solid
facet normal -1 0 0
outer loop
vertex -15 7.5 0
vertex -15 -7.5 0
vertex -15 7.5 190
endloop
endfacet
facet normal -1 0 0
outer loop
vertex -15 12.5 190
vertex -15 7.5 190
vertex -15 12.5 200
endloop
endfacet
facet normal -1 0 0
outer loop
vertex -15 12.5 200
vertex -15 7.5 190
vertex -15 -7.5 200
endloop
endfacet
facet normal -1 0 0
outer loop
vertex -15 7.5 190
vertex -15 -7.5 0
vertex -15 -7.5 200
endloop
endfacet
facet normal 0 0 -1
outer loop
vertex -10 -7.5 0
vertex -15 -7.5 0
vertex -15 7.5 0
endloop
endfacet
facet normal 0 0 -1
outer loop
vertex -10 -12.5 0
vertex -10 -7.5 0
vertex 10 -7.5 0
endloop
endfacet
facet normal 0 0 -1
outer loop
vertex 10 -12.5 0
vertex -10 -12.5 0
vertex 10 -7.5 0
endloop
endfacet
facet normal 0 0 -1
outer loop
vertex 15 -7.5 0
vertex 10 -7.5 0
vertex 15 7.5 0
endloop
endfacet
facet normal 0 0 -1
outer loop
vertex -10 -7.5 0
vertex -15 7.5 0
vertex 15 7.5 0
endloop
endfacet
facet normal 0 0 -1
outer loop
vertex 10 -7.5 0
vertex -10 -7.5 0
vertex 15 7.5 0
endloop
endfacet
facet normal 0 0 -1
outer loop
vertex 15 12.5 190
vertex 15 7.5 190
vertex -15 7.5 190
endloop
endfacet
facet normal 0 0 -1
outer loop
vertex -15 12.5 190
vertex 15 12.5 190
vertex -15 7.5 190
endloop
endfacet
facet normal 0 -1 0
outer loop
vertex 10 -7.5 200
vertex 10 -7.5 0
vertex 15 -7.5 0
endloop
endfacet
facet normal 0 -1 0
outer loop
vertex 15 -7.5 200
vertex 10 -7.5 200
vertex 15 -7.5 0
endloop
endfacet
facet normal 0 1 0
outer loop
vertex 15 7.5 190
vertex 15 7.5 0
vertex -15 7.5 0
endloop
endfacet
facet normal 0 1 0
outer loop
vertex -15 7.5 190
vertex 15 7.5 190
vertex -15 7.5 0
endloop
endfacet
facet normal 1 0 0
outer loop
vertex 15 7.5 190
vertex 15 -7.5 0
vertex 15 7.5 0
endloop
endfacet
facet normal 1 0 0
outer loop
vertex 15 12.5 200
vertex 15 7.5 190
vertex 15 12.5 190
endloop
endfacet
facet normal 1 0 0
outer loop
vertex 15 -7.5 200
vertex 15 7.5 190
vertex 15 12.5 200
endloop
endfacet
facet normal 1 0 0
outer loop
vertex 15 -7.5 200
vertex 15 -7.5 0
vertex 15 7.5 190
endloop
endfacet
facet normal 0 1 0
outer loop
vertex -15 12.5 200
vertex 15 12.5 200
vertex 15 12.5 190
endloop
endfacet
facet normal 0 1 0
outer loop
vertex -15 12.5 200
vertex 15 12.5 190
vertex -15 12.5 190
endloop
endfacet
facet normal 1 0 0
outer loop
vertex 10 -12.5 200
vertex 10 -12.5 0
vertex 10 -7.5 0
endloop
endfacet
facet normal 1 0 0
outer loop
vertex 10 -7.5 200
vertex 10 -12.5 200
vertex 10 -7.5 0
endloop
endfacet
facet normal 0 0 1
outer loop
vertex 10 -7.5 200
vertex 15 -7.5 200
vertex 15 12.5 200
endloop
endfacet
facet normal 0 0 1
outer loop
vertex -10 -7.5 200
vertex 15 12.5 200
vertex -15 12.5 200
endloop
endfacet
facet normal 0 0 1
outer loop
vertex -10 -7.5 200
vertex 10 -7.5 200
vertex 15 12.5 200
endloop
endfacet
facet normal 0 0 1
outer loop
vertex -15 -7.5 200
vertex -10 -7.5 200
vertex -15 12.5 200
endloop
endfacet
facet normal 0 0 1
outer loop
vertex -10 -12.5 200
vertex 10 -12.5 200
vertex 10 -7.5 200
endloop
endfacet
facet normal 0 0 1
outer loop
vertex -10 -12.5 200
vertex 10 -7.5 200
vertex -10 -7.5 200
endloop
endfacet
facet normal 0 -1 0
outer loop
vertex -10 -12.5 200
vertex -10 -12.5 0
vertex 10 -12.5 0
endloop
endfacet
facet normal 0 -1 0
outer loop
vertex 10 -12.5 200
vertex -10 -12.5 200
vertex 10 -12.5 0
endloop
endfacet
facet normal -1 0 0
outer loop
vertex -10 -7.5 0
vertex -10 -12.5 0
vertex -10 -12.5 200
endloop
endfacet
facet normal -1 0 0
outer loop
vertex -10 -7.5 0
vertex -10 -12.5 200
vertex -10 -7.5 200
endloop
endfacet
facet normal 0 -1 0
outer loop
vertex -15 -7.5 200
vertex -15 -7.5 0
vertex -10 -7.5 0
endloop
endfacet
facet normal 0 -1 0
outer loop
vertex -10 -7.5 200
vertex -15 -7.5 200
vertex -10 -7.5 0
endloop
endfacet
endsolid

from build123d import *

# Parameters (mm, degrees)
F0_W     = 20
F0_H     = 5
F1_DEPTH = 200
F2_W     = 30
F2_H     = 10
F3_DEPTH = 5


with BuildPart() as f1:
    # F0 (on Top) → F1 (new body)
    with BuildSketch(Plane.XY):
        Polygon((15, -7.5), (15, 7.5), (-15, 7.5), (-15, -7.5), (-10, -7.5), (-10, -2.5), (10, -2.5), (10, -7.5), align=None)
        with Locations((0, -5)):
            Rectangle(F0_W, F0_H)
        with Locations((0, -10)):
            Rectangle(F0_W, F0_H)
    extrude(amount=F1_DEPTH)

    # F2 (on face) → F3 (join)
    with BuildSketch(Plane(origin=(0, 7.5, 0), x_dir=(-1, 0, 0), z_dir=(0, 1, 0))):
        with Locations((0, 195)):
            Rectangle(F2_W, F2_H)
    extrude(amount=F3_DEPTH)


solid = f1.part
